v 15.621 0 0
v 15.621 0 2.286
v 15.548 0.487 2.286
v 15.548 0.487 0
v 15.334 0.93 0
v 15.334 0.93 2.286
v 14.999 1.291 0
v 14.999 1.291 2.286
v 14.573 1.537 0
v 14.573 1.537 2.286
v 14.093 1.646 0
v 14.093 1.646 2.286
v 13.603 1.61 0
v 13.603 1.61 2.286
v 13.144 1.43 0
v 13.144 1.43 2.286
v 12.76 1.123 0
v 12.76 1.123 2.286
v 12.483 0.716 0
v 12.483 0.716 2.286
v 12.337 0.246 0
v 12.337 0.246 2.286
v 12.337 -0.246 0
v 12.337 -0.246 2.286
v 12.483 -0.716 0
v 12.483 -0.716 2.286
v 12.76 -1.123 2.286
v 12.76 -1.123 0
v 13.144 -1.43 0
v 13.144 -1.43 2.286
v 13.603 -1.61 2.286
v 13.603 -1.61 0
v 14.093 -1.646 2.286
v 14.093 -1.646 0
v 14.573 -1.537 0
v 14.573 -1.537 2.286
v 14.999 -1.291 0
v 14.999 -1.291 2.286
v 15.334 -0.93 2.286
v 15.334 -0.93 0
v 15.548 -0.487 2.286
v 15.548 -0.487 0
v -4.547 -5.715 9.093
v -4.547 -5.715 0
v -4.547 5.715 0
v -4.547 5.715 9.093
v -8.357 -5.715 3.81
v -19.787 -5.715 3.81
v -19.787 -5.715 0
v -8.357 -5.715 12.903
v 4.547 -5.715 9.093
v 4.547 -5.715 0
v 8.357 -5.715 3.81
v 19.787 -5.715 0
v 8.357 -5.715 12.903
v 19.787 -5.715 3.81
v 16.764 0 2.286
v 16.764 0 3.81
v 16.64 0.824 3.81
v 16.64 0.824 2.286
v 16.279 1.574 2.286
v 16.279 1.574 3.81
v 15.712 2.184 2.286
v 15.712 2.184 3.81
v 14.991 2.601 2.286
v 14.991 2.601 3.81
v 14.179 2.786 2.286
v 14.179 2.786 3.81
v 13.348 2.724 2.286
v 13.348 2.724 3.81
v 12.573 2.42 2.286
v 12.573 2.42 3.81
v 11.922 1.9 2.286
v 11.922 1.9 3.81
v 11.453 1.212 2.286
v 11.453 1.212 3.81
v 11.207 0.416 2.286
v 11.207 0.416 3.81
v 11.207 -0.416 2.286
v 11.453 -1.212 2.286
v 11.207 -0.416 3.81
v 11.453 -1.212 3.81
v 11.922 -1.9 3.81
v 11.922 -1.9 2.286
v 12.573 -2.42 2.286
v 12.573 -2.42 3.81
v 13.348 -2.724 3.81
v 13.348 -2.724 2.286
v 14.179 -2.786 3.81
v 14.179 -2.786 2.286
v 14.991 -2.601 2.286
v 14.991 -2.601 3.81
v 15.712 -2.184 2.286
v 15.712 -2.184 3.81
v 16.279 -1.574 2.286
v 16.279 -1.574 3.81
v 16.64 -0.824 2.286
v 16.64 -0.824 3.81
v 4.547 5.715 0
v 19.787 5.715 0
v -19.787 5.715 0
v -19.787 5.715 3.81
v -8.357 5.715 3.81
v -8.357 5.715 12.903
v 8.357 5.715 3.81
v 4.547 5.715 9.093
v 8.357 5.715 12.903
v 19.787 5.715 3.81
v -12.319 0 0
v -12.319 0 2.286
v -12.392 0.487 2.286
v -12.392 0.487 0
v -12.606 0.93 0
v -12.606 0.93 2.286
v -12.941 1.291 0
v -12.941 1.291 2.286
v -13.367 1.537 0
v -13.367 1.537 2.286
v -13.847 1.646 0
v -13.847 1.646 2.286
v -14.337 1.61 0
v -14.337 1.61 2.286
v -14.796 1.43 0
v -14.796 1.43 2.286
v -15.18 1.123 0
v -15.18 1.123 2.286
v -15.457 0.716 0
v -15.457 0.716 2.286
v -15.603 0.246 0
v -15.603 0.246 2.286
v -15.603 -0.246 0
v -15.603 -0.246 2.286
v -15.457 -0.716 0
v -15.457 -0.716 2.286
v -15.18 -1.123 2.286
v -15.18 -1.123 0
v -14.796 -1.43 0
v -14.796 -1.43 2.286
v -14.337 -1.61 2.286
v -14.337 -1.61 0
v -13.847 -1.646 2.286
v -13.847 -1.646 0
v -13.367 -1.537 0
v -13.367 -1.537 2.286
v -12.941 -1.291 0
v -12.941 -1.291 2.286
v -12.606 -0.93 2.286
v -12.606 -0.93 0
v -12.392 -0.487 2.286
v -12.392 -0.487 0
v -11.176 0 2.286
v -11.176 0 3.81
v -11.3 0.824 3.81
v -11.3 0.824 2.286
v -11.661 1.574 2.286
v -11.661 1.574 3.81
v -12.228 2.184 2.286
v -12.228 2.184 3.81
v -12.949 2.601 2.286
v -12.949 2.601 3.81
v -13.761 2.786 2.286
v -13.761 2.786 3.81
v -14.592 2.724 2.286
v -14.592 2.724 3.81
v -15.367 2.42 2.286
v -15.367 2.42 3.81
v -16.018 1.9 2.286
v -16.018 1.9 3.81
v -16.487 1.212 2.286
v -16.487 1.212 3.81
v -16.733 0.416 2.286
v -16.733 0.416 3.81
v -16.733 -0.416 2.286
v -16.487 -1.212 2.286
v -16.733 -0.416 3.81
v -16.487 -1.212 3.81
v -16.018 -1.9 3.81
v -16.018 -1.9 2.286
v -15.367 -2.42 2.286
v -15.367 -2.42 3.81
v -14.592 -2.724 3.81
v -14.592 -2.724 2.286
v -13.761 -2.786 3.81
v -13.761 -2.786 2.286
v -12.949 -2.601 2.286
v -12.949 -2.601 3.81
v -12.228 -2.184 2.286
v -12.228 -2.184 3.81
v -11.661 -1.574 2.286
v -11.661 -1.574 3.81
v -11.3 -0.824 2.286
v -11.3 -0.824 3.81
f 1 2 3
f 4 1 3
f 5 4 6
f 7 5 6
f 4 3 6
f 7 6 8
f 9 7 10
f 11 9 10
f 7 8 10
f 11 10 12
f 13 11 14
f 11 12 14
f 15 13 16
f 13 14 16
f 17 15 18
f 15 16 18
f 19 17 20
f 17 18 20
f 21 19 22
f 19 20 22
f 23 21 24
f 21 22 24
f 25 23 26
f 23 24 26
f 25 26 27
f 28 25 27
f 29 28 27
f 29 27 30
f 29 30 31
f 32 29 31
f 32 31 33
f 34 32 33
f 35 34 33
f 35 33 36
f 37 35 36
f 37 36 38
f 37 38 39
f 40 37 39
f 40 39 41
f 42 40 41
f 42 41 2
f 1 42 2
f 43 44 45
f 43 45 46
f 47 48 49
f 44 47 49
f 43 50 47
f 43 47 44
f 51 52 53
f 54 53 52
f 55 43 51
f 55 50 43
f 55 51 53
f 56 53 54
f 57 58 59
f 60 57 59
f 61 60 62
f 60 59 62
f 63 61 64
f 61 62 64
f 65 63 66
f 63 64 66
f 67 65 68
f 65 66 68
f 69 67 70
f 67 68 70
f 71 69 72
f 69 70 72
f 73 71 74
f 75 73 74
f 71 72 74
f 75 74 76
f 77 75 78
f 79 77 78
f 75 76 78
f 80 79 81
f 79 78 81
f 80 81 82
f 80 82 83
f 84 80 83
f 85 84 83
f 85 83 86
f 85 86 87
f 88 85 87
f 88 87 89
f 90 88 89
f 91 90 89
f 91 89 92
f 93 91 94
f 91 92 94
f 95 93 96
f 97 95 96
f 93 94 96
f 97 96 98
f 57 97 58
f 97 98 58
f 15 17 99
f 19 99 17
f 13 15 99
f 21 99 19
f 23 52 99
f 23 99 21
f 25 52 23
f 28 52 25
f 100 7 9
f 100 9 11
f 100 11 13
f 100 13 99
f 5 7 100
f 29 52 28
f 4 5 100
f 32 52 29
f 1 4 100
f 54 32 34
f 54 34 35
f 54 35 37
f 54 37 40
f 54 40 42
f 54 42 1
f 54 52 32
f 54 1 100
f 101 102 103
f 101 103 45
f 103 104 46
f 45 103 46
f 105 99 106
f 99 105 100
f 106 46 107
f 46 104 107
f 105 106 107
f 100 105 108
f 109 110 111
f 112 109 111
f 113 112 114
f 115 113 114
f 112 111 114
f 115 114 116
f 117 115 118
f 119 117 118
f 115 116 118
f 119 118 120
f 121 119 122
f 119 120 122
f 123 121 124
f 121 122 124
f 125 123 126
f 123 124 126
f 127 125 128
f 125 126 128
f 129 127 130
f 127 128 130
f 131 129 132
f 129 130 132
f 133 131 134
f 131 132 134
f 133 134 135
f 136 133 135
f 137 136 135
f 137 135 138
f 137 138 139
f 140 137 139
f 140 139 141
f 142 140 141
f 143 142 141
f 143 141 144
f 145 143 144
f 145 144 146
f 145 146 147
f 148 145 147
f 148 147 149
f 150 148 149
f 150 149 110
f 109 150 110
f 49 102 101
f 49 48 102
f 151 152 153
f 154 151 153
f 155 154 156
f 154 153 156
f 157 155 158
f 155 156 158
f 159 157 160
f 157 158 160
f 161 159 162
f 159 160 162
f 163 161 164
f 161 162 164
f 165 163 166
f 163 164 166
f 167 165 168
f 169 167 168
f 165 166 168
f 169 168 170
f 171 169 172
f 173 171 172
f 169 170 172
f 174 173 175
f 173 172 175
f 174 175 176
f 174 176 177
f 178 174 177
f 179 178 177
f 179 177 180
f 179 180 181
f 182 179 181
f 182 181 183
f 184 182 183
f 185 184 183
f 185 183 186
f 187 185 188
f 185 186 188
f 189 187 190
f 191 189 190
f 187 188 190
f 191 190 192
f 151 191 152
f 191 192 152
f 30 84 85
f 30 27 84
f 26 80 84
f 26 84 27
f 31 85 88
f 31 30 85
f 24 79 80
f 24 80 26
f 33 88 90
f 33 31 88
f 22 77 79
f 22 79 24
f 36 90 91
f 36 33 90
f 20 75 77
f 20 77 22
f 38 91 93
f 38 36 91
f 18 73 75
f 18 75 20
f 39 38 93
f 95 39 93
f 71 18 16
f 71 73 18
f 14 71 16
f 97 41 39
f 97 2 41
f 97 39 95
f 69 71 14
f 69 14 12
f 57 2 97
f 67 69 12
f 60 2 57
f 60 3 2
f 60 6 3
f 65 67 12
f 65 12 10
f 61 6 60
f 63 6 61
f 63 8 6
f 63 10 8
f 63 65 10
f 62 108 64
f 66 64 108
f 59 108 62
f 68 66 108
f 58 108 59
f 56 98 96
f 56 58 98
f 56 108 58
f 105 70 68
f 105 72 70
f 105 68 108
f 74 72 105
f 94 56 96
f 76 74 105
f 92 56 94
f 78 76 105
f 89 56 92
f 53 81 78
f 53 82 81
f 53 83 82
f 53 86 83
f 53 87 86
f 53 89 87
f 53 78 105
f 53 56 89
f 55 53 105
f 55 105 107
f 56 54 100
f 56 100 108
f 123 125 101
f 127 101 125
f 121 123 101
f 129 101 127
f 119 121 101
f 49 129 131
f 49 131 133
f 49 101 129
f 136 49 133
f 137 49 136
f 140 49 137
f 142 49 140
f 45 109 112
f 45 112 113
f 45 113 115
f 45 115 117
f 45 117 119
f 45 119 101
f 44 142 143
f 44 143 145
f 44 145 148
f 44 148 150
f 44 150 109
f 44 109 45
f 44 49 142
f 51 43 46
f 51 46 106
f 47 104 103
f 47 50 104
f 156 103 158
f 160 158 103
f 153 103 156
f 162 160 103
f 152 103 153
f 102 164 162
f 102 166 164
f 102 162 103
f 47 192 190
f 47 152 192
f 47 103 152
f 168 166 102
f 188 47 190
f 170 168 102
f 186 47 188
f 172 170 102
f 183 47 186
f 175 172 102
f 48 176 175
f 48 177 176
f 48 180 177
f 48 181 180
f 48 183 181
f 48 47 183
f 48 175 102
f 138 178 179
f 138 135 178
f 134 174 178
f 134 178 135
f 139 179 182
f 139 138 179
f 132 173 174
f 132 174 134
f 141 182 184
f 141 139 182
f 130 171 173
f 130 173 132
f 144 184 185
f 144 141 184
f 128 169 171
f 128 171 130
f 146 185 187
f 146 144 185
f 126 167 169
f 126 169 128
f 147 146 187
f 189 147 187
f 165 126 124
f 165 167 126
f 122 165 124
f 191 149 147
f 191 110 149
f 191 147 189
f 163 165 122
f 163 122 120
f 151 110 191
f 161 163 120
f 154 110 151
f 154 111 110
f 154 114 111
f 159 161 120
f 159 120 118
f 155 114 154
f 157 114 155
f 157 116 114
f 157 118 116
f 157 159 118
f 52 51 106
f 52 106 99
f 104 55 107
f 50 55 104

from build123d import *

# Parameters (mm, degrees)
F1_DEPTH = 5.715
F2_R     = 1.651
F3_DEPTH = 3.811
F2_R_2   = 2.794
F4_DEPTH = 1.524


with BuildPart() as f1:
    # F0 (on Front) → F1 (new body, symmetric)
    with BuildSketch(Plane.XZ):
        Polygon((-19.7866, 3.81), (-19.7866, 0), (-4.5466, 0), (-4.5466, 9.0932), (4.5466, 9.0932), (4.5466, 0), (19.7866, 0), (19.7866, 3.81), (8.3566, 3.81), (8.3566, 12.9032), (-8.3566, 12.9032), (-8.3566, 3.81), align=None)
    extrude(amount=F1_DEPTH, both=True)

    # F2 (on face) → F3 (cut, through all)
    with BuildSketch(Plane.XY.offset(3.81)):
        with Locations((-13.97, 0)):
            Circle(F2_R)
        with Locations((13.97, 0)):
            Circle(F2_R)
    extrude(amount=-F3_DEPTH, mode=Mode.SUBTRACT)

    # F2 (on face) → F4 (cut)
    with BuildSketch(Plane.XY.offset(3.81)):
        with Locations((13.97, 0)):
            Circle(F2_R_2)
        with Locations((13.97, 0)):
            Circle(F2_R, mode=Mode.SUBTRACT)
        with Locations((-13.97, 0)):
            Circle(F2_R_2)
        with Locations((-13.97, 0)):
            Circle(F2_R, mode=Mode.SUBTRACT)
    extrude(amount=-F4_DEPTH, mode=Mode.SUBTRACT)


solid = f1.part
